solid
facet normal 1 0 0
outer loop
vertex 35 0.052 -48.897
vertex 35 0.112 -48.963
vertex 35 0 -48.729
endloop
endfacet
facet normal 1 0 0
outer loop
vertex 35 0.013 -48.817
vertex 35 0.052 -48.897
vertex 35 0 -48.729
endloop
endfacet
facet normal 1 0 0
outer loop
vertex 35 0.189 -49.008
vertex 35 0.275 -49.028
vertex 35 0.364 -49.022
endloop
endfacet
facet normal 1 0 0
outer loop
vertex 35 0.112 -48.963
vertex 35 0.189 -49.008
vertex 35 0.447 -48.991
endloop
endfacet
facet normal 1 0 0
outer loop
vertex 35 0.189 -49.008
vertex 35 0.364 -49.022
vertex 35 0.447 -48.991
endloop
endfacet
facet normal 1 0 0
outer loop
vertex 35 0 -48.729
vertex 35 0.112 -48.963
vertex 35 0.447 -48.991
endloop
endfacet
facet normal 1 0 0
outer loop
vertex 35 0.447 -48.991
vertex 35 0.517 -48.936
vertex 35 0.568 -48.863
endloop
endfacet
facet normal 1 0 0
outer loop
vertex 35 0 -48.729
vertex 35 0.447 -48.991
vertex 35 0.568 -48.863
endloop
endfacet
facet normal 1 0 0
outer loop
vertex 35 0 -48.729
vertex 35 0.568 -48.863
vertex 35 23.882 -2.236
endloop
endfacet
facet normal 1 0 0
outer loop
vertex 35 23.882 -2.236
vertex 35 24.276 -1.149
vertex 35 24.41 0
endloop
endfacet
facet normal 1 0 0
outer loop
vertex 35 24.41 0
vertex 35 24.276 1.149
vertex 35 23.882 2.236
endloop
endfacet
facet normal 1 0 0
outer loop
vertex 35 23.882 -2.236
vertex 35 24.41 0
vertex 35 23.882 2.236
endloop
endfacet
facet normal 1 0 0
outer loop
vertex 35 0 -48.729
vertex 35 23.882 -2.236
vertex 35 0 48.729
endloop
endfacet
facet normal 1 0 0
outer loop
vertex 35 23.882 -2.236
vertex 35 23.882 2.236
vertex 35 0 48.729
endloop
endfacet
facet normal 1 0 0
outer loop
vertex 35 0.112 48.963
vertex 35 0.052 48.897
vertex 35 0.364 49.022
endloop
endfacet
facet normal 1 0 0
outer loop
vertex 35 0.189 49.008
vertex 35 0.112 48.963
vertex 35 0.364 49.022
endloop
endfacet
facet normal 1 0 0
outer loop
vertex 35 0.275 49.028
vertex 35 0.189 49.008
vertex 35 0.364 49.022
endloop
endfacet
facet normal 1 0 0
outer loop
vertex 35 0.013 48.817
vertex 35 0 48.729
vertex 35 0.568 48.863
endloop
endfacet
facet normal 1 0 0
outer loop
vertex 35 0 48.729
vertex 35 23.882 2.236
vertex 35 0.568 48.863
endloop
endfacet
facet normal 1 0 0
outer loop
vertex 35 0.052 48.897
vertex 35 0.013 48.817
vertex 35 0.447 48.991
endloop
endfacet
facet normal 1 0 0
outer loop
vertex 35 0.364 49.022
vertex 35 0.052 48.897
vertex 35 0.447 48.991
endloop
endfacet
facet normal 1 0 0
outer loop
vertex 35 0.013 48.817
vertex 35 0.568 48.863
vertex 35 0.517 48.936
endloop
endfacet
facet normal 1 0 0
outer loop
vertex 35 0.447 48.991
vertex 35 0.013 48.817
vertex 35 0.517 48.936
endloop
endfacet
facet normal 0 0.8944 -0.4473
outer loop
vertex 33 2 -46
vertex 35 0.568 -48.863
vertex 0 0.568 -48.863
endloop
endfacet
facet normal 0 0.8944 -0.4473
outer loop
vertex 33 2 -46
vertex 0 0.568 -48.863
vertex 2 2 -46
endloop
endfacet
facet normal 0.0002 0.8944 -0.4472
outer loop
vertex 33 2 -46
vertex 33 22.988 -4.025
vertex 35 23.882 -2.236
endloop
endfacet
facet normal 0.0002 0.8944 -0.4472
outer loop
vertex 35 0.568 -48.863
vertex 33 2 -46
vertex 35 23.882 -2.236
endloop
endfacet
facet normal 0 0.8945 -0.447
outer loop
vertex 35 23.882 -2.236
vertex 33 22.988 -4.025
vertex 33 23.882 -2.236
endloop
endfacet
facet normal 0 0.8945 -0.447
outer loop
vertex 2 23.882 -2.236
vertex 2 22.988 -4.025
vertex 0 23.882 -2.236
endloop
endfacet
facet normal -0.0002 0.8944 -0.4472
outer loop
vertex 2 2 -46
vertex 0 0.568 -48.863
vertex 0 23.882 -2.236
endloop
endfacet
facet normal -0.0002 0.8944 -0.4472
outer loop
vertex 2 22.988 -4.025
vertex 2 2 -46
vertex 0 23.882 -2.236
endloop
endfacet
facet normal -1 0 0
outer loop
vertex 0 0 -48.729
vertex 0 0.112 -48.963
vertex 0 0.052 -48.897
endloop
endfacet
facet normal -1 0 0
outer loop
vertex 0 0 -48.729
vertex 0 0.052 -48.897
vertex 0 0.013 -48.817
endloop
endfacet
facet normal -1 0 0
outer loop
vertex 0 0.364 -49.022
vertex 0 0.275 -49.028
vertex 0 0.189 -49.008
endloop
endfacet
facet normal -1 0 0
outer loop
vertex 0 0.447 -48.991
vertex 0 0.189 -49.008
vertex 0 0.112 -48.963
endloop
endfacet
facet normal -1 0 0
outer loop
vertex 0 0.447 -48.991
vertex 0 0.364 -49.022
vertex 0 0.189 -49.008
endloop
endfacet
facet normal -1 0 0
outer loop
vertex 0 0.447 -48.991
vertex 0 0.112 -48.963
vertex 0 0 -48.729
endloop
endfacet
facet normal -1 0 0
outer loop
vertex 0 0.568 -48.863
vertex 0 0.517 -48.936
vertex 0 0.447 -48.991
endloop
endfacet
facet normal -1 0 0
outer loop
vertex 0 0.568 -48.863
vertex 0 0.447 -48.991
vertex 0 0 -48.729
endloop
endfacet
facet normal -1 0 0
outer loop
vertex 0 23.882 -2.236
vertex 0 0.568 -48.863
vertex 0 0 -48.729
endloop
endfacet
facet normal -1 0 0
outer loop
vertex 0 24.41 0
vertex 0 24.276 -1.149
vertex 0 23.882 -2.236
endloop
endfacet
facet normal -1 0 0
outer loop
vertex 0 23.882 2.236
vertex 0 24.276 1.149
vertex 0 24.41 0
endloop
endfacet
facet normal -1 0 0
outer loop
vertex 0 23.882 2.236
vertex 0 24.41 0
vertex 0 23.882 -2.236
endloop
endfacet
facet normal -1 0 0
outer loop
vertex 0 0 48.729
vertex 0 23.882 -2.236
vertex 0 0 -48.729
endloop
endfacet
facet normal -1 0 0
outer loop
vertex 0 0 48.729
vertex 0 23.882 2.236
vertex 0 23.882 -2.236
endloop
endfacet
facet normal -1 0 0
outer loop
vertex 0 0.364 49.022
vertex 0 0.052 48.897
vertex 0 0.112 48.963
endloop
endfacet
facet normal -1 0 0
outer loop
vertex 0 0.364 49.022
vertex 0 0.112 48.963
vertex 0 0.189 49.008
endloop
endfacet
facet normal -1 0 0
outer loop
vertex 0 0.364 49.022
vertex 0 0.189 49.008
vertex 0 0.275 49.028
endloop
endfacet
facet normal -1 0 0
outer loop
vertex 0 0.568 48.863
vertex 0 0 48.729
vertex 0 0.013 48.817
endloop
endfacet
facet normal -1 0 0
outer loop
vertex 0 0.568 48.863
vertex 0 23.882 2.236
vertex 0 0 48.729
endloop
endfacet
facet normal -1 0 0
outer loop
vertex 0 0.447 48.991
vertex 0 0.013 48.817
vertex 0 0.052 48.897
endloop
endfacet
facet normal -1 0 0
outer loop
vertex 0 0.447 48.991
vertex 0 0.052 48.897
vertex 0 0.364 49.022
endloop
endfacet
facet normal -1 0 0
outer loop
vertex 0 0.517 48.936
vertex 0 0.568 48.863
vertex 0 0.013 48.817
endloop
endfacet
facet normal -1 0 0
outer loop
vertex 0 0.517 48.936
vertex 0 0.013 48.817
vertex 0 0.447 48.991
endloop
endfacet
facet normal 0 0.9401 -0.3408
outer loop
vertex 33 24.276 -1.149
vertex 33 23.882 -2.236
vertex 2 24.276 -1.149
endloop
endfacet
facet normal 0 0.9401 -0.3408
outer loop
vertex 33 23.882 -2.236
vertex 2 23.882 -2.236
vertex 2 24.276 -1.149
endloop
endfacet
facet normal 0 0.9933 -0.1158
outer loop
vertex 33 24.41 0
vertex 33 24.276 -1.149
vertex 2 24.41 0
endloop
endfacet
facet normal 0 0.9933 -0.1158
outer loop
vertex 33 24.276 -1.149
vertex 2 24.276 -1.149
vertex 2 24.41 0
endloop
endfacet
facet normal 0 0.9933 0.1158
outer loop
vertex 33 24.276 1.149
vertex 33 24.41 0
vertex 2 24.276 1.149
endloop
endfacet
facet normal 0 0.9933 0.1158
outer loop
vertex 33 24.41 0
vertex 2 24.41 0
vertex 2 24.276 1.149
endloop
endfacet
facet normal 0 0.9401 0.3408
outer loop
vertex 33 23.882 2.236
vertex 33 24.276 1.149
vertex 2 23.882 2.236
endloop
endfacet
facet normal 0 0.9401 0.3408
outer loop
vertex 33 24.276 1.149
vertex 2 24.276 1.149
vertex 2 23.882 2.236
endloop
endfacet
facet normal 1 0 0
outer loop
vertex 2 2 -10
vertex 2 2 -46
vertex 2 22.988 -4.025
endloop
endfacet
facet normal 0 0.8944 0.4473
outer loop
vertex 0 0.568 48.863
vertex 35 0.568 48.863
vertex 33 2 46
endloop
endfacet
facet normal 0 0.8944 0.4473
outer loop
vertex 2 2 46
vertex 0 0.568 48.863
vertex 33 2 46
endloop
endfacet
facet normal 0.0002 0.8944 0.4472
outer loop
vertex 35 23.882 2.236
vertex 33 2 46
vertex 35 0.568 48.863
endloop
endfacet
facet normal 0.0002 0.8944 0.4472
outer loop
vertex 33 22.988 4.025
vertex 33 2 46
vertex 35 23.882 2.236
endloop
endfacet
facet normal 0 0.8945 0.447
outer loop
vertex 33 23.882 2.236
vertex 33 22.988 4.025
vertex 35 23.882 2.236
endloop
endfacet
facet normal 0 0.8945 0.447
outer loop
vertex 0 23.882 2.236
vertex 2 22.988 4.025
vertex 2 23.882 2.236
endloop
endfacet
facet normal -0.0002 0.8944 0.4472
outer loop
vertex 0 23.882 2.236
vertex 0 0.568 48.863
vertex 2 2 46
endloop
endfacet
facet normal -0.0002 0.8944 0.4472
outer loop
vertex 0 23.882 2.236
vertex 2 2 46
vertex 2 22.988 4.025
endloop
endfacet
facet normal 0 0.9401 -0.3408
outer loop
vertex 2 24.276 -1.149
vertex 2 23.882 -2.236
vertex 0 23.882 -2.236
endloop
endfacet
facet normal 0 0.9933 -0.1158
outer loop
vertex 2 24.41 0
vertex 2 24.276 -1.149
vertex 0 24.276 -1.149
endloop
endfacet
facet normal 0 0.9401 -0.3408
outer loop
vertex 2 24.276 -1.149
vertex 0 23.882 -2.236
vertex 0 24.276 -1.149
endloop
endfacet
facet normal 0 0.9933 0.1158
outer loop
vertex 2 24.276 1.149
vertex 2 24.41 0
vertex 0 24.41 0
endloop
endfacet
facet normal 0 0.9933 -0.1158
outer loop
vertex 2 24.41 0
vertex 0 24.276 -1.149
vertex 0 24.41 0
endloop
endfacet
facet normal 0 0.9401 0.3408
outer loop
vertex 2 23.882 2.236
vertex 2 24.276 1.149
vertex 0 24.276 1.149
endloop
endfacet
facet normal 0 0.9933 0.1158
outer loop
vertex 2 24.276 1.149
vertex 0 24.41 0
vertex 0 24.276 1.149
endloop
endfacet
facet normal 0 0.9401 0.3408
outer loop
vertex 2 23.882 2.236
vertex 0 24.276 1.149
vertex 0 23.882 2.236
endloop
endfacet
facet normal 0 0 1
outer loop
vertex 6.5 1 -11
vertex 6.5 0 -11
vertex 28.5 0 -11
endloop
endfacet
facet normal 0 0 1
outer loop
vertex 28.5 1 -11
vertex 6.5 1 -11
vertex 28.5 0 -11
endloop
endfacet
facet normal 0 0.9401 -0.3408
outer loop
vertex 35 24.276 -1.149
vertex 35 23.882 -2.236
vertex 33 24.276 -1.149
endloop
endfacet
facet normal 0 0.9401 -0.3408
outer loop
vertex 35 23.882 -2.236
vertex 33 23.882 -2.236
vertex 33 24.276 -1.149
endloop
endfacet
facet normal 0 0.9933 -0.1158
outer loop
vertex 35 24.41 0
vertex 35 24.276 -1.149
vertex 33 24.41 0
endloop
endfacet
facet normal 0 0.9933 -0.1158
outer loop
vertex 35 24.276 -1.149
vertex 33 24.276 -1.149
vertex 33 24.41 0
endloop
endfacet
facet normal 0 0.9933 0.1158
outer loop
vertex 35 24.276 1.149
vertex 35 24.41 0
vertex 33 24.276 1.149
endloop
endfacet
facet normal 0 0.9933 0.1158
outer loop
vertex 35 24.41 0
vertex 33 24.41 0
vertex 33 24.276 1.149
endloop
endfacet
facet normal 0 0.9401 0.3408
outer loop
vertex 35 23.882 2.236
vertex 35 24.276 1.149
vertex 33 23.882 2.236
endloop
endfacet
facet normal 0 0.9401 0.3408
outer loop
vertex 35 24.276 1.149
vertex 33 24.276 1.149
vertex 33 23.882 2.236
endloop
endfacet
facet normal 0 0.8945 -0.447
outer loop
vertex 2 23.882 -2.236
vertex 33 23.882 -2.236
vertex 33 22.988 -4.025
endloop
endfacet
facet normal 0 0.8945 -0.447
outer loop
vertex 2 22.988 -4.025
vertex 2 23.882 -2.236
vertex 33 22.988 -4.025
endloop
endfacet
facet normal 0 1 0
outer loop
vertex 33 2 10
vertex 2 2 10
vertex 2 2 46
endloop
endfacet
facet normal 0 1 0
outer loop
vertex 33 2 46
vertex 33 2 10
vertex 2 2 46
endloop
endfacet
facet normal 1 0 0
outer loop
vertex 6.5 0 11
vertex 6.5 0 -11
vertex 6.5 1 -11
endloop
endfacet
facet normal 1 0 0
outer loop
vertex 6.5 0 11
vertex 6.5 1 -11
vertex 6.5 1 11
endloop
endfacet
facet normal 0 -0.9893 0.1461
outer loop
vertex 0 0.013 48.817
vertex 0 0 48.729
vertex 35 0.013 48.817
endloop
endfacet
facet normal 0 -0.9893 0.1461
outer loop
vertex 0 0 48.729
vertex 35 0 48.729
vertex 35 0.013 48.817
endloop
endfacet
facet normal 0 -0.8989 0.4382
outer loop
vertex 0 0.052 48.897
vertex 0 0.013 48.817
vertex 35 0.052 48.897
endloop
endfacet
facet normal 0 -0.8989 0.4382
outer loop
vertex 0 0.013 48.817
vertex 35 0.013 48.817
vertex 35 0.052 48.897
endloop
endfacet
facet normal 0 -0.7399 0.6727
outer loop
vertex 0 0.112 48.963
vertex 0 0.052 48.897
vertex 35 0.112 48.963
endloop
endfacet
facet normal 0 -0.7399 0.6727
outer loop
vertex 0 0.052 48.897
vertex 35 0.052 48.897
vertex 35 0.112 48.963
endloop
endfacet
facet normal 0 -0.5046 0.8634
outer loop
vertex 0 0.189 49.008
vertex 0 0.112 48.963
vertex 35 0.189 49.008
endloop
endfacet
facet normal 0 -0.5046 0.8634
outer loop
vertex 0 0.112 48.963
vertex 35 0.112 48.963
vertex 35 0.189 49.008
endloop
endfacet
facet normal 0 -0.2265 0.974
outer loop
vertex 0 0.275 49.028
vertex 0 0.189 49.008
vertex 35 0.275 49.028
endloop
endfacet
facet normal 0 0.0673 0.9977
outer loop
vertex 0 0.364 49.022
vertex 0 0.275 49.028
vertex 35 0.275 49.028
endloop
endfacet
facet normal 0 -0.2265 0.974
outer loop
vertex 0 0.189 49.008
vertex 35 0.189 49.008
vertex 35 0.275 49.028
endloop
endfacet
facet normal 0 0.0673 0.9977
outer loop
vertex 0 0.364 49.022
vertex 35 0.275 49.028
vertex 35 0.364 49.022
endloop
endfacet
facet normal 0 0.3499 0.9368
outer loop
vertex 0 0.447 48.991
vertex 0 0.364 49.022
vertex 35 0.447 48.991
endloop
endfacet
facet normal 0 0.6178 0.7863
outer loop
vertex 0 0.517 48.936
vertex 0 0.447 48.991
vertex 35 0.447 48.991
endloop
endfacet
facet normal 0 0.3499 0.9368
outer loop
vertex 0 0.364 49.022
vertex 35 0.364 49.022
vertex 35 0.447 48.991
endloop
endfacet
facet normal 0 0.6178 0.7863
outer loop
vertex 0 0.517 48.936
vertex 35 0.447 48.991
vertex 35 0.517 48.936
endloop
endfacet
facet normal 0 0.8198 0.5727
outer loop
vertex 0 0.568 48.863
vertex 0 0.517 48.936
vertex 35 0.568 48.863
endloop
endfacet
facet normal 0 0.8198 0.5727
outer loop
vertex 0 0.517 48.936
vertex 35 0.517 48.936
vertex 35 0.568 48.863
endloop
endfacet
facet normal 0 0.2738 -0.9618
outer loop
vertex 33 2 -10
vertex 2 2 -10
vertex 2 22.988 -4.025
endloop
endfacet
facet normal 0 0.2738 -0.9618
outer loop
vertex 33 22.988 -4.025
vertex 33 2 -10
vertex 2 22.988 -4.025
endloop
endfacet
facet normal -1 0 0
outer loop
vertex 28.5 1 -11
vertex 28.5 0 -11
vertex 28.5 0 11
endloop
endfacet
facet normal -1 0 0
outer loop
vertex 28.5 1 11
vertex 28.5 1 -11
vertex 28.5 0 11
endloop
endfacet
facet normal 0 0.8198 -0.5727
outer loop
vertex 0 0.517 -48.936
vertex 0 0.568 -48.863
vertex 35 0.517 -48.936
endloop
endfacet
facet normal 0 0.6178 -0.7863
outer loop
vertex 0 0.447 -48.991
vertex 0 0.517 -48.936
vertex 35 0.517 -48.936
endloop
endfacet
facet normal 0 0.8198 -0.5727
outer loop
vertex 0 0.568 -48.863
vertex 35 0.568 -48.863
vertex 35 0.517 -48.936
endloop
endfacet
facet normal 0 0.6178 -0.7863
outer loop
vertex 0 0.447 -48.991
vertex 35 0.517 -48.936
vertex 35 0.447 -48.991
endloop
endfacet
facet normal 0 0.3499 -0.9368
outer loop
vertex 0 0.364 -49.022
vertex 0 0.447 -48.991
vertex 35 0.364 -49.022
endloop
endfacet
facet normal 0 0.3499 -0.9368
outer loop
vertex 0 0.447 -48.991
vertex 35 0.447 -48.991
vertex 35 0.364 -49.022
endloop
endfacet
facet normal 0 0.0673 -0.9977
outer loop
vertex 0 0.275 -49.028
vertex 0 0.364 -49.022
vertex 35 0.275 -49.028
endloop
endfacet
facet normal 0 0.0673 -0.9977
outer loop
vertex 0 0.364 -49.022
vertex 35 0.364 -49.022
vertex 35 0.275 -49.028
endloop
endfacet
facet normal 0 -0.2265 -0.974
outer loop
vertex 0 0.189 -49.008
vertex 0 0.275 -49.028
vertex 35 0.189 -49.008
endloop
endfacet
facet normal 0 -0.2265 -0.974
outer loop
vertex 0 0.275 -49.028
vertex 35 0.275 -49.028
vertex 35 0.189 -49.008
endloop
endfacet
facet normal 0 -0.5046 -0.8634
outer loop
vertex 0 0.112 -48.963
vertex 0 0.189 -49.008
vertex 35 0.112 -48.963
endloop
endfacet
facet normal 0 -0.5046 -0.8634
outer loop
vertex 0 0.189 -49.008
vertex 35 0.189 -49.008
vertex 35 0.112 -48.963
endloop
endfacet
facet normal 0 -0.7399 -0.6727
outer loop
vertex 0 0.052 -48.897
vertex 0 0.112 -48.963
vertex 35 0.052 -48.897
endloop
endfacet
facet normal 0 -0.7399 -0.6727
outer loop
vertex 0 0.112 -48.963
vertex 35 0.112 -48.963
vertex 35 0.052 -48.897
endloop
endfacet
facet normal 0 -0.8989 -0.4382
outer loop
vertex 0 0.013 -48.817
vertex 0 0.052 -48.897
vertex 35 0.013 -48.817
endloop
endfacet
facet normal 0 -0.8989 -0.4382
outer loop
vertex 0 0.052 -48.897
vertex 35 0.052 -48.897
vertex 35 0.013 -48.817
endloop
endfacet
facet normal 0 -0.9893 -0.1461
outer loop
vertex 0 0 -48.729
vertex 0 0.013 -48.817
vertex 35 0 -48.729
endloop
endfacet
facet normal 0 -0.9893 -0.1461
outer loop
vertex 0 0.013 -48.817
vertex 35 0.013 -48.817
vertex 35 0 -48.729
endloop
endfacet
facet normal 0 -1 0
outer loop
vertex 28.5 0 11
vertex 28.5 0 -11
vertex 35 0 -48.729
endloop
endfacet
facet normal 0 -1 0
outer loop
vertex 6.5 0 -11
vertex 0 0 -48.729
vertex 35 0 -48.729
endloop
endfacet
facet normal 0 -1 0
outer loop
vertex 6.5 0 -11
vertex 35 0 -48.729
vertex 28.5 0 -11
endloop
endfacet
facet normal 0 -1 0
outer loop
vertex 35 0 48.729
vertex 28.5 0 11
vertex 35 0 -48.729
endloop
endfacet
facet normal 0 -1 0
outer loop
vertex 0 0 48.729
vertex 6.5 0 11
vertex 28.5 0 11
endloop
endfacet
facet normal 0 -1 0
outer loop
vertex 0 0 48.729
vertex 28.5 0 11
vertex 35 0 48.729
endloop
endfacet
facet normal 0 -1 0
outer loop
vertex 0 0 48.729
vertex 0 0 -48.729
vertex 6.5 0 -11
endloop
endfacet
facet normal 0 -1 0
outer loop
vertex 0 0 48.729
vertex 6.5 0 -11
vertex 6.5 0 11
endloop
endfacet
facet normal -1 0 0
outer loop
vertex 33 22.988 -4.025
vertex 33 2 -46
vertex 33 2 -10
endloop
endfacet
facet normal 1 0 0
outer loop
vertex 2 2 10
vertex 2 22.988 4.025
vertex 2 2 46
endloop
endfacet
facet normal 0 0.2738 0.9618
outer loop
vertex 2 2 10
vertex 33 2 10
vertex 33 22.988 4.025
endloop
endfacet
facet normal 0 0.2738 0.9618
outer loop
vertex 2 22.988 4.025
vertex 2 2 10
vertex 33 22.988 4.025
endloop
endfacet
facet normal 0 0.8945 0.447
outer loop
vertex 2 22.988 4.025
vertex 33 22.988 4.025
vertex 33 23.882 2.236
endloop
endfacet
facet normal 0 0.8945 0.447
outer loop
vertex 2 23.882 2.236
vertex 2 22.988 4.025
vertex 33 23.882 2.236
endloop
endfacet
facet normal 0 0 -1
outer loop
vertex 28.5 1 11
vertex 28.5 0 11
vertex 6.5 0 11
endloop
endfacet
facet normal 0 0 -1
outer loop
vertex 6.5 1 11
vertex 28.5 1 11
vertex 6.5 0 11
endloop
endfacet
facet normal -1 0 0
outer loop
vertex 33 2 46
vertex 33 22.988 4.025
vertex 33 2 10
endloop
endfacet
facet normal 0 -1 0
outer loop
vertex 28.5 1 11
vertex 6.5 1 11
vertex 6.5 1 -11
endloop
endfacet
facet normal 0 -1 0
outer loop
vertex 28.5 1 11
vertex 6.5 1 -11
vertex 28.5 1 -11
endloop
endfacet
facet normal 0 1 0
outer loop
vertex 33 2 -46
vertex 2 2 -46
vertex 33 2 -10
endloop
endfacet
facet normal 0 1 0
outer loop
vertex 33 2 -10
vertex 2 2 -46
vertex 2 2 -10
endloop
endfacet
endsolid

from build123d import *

# Parameters (mm, degrees)
BOSS_EXTRUDE5_DEPTH = 35
SHELL8_T            = -2
BOSS_EXTRUDE6_DEPTH = 31
BOSS_EXTRUDE7_DEPTH = 31
FILLET1_R           = 5
FILLET2_R           = 0.3
FILLET3_R           = 0.3
SKETCH3_W           = 11
SKETCH3_H           = 22
CUT_EXTRUDE2_DEPTH  = 1


with BuildPart() as part:
    # Sketch2 → Boss-Extrude5 (new body)
    with BuildSketch(Plane(origin=(0, 0, 0), x_dir=(0, 0, -1), z_dir=(1, 0, 0))):
        Polygon((0, 0), (50, 0), (0, 25), align=None)
    boss_extrude5 = extrude(amount=BOSS_EXTRUDE5_DEPTH)

    # Mirror1: Boss-Extrude5 across Front Plane
    add(boss_extrude5.mirror(Plane.XY))

    # Shell8
    shell8_openings = [part.faces().sort_by_distance(p)[0] for p in [
        (17.5, 12.5, 25),
        (17.5, 12.5, -25),
    ]]
    offset(amount=SHELL8_T, openings=shell8_openings, kind=Kind.INTERSECTION)

    # 3DSketch9 → Boss-Extrude6 (add)
    with BuildSketch(Plane(origin=(33, 25, 0), x_dir=(0, -0.9850310317593959, -0.1723771054143217), z_dir=(-1, 0, 0))):
        Polygon((0, 0), (2.676141178, -3.617771192), (23.349518196, 0), (21.961909265, 7.929346849), (1.288532246, 4.311575657), align=None)
    extrude(amount=BOSS_EXTRUDE6_DEPTH)

    # 3DSketch10 → Boss-Extrude7 (add)
    with BuildSketch(Plane(origin=(33, 2, -4.024922359), x_dir=(0, 0.9336773848792517, 0.3581152621224651), z_dir=(1, 0, 0))):
        Polygon((0, 0), (-2.139766495, -5.578794866), (19.595590361, -7.515957966), align=None)
        Polygon((2.882772252, 7.515957966), (5.022538747, 13.094752832), (22.478362612, 0), align=None)
    extrude(amount=-BOSS_EXTRUDE7_DEPTH)

    # Fillet1
    fillet1_edges = [part.edges().sort_by_distance(p)[0] for p in [
        (17.5, 25, 0),
    ]]
    fillet(fillet1_edges, radius=FILLET1_R)

    # Fillet2
    fillet2_edges = [part.edges().sort_by_distance(p)[0] for p in [
        (17.5, 0, -50),
    ]]
    fillet(fillet2_edges, radius=FILLET2_R)

    # Fillet3
    fillet3_edges = [part.edges().sort_by_distance(p)[0] for p in [
        (17.5, 0, 50),
    ]]
    fillet(fillet3_edges, radius=FILLET3_R)

    # Sketch3 → Cut-Extrude2 (cut)
    with BuildSketch(Plane.XZ):
        with Locations((12, 0)):
            Rectangle(SKETCH3_W, SKETCH3_H)
        with Locations((23, 0)):
            Rectangle(SKETCH3_W, SKETCH3_H)
    extrude(amount=-CUT_EXTRUDE2_DEPTH, mode=Mode.SUBTRACT)


solid = part.part
